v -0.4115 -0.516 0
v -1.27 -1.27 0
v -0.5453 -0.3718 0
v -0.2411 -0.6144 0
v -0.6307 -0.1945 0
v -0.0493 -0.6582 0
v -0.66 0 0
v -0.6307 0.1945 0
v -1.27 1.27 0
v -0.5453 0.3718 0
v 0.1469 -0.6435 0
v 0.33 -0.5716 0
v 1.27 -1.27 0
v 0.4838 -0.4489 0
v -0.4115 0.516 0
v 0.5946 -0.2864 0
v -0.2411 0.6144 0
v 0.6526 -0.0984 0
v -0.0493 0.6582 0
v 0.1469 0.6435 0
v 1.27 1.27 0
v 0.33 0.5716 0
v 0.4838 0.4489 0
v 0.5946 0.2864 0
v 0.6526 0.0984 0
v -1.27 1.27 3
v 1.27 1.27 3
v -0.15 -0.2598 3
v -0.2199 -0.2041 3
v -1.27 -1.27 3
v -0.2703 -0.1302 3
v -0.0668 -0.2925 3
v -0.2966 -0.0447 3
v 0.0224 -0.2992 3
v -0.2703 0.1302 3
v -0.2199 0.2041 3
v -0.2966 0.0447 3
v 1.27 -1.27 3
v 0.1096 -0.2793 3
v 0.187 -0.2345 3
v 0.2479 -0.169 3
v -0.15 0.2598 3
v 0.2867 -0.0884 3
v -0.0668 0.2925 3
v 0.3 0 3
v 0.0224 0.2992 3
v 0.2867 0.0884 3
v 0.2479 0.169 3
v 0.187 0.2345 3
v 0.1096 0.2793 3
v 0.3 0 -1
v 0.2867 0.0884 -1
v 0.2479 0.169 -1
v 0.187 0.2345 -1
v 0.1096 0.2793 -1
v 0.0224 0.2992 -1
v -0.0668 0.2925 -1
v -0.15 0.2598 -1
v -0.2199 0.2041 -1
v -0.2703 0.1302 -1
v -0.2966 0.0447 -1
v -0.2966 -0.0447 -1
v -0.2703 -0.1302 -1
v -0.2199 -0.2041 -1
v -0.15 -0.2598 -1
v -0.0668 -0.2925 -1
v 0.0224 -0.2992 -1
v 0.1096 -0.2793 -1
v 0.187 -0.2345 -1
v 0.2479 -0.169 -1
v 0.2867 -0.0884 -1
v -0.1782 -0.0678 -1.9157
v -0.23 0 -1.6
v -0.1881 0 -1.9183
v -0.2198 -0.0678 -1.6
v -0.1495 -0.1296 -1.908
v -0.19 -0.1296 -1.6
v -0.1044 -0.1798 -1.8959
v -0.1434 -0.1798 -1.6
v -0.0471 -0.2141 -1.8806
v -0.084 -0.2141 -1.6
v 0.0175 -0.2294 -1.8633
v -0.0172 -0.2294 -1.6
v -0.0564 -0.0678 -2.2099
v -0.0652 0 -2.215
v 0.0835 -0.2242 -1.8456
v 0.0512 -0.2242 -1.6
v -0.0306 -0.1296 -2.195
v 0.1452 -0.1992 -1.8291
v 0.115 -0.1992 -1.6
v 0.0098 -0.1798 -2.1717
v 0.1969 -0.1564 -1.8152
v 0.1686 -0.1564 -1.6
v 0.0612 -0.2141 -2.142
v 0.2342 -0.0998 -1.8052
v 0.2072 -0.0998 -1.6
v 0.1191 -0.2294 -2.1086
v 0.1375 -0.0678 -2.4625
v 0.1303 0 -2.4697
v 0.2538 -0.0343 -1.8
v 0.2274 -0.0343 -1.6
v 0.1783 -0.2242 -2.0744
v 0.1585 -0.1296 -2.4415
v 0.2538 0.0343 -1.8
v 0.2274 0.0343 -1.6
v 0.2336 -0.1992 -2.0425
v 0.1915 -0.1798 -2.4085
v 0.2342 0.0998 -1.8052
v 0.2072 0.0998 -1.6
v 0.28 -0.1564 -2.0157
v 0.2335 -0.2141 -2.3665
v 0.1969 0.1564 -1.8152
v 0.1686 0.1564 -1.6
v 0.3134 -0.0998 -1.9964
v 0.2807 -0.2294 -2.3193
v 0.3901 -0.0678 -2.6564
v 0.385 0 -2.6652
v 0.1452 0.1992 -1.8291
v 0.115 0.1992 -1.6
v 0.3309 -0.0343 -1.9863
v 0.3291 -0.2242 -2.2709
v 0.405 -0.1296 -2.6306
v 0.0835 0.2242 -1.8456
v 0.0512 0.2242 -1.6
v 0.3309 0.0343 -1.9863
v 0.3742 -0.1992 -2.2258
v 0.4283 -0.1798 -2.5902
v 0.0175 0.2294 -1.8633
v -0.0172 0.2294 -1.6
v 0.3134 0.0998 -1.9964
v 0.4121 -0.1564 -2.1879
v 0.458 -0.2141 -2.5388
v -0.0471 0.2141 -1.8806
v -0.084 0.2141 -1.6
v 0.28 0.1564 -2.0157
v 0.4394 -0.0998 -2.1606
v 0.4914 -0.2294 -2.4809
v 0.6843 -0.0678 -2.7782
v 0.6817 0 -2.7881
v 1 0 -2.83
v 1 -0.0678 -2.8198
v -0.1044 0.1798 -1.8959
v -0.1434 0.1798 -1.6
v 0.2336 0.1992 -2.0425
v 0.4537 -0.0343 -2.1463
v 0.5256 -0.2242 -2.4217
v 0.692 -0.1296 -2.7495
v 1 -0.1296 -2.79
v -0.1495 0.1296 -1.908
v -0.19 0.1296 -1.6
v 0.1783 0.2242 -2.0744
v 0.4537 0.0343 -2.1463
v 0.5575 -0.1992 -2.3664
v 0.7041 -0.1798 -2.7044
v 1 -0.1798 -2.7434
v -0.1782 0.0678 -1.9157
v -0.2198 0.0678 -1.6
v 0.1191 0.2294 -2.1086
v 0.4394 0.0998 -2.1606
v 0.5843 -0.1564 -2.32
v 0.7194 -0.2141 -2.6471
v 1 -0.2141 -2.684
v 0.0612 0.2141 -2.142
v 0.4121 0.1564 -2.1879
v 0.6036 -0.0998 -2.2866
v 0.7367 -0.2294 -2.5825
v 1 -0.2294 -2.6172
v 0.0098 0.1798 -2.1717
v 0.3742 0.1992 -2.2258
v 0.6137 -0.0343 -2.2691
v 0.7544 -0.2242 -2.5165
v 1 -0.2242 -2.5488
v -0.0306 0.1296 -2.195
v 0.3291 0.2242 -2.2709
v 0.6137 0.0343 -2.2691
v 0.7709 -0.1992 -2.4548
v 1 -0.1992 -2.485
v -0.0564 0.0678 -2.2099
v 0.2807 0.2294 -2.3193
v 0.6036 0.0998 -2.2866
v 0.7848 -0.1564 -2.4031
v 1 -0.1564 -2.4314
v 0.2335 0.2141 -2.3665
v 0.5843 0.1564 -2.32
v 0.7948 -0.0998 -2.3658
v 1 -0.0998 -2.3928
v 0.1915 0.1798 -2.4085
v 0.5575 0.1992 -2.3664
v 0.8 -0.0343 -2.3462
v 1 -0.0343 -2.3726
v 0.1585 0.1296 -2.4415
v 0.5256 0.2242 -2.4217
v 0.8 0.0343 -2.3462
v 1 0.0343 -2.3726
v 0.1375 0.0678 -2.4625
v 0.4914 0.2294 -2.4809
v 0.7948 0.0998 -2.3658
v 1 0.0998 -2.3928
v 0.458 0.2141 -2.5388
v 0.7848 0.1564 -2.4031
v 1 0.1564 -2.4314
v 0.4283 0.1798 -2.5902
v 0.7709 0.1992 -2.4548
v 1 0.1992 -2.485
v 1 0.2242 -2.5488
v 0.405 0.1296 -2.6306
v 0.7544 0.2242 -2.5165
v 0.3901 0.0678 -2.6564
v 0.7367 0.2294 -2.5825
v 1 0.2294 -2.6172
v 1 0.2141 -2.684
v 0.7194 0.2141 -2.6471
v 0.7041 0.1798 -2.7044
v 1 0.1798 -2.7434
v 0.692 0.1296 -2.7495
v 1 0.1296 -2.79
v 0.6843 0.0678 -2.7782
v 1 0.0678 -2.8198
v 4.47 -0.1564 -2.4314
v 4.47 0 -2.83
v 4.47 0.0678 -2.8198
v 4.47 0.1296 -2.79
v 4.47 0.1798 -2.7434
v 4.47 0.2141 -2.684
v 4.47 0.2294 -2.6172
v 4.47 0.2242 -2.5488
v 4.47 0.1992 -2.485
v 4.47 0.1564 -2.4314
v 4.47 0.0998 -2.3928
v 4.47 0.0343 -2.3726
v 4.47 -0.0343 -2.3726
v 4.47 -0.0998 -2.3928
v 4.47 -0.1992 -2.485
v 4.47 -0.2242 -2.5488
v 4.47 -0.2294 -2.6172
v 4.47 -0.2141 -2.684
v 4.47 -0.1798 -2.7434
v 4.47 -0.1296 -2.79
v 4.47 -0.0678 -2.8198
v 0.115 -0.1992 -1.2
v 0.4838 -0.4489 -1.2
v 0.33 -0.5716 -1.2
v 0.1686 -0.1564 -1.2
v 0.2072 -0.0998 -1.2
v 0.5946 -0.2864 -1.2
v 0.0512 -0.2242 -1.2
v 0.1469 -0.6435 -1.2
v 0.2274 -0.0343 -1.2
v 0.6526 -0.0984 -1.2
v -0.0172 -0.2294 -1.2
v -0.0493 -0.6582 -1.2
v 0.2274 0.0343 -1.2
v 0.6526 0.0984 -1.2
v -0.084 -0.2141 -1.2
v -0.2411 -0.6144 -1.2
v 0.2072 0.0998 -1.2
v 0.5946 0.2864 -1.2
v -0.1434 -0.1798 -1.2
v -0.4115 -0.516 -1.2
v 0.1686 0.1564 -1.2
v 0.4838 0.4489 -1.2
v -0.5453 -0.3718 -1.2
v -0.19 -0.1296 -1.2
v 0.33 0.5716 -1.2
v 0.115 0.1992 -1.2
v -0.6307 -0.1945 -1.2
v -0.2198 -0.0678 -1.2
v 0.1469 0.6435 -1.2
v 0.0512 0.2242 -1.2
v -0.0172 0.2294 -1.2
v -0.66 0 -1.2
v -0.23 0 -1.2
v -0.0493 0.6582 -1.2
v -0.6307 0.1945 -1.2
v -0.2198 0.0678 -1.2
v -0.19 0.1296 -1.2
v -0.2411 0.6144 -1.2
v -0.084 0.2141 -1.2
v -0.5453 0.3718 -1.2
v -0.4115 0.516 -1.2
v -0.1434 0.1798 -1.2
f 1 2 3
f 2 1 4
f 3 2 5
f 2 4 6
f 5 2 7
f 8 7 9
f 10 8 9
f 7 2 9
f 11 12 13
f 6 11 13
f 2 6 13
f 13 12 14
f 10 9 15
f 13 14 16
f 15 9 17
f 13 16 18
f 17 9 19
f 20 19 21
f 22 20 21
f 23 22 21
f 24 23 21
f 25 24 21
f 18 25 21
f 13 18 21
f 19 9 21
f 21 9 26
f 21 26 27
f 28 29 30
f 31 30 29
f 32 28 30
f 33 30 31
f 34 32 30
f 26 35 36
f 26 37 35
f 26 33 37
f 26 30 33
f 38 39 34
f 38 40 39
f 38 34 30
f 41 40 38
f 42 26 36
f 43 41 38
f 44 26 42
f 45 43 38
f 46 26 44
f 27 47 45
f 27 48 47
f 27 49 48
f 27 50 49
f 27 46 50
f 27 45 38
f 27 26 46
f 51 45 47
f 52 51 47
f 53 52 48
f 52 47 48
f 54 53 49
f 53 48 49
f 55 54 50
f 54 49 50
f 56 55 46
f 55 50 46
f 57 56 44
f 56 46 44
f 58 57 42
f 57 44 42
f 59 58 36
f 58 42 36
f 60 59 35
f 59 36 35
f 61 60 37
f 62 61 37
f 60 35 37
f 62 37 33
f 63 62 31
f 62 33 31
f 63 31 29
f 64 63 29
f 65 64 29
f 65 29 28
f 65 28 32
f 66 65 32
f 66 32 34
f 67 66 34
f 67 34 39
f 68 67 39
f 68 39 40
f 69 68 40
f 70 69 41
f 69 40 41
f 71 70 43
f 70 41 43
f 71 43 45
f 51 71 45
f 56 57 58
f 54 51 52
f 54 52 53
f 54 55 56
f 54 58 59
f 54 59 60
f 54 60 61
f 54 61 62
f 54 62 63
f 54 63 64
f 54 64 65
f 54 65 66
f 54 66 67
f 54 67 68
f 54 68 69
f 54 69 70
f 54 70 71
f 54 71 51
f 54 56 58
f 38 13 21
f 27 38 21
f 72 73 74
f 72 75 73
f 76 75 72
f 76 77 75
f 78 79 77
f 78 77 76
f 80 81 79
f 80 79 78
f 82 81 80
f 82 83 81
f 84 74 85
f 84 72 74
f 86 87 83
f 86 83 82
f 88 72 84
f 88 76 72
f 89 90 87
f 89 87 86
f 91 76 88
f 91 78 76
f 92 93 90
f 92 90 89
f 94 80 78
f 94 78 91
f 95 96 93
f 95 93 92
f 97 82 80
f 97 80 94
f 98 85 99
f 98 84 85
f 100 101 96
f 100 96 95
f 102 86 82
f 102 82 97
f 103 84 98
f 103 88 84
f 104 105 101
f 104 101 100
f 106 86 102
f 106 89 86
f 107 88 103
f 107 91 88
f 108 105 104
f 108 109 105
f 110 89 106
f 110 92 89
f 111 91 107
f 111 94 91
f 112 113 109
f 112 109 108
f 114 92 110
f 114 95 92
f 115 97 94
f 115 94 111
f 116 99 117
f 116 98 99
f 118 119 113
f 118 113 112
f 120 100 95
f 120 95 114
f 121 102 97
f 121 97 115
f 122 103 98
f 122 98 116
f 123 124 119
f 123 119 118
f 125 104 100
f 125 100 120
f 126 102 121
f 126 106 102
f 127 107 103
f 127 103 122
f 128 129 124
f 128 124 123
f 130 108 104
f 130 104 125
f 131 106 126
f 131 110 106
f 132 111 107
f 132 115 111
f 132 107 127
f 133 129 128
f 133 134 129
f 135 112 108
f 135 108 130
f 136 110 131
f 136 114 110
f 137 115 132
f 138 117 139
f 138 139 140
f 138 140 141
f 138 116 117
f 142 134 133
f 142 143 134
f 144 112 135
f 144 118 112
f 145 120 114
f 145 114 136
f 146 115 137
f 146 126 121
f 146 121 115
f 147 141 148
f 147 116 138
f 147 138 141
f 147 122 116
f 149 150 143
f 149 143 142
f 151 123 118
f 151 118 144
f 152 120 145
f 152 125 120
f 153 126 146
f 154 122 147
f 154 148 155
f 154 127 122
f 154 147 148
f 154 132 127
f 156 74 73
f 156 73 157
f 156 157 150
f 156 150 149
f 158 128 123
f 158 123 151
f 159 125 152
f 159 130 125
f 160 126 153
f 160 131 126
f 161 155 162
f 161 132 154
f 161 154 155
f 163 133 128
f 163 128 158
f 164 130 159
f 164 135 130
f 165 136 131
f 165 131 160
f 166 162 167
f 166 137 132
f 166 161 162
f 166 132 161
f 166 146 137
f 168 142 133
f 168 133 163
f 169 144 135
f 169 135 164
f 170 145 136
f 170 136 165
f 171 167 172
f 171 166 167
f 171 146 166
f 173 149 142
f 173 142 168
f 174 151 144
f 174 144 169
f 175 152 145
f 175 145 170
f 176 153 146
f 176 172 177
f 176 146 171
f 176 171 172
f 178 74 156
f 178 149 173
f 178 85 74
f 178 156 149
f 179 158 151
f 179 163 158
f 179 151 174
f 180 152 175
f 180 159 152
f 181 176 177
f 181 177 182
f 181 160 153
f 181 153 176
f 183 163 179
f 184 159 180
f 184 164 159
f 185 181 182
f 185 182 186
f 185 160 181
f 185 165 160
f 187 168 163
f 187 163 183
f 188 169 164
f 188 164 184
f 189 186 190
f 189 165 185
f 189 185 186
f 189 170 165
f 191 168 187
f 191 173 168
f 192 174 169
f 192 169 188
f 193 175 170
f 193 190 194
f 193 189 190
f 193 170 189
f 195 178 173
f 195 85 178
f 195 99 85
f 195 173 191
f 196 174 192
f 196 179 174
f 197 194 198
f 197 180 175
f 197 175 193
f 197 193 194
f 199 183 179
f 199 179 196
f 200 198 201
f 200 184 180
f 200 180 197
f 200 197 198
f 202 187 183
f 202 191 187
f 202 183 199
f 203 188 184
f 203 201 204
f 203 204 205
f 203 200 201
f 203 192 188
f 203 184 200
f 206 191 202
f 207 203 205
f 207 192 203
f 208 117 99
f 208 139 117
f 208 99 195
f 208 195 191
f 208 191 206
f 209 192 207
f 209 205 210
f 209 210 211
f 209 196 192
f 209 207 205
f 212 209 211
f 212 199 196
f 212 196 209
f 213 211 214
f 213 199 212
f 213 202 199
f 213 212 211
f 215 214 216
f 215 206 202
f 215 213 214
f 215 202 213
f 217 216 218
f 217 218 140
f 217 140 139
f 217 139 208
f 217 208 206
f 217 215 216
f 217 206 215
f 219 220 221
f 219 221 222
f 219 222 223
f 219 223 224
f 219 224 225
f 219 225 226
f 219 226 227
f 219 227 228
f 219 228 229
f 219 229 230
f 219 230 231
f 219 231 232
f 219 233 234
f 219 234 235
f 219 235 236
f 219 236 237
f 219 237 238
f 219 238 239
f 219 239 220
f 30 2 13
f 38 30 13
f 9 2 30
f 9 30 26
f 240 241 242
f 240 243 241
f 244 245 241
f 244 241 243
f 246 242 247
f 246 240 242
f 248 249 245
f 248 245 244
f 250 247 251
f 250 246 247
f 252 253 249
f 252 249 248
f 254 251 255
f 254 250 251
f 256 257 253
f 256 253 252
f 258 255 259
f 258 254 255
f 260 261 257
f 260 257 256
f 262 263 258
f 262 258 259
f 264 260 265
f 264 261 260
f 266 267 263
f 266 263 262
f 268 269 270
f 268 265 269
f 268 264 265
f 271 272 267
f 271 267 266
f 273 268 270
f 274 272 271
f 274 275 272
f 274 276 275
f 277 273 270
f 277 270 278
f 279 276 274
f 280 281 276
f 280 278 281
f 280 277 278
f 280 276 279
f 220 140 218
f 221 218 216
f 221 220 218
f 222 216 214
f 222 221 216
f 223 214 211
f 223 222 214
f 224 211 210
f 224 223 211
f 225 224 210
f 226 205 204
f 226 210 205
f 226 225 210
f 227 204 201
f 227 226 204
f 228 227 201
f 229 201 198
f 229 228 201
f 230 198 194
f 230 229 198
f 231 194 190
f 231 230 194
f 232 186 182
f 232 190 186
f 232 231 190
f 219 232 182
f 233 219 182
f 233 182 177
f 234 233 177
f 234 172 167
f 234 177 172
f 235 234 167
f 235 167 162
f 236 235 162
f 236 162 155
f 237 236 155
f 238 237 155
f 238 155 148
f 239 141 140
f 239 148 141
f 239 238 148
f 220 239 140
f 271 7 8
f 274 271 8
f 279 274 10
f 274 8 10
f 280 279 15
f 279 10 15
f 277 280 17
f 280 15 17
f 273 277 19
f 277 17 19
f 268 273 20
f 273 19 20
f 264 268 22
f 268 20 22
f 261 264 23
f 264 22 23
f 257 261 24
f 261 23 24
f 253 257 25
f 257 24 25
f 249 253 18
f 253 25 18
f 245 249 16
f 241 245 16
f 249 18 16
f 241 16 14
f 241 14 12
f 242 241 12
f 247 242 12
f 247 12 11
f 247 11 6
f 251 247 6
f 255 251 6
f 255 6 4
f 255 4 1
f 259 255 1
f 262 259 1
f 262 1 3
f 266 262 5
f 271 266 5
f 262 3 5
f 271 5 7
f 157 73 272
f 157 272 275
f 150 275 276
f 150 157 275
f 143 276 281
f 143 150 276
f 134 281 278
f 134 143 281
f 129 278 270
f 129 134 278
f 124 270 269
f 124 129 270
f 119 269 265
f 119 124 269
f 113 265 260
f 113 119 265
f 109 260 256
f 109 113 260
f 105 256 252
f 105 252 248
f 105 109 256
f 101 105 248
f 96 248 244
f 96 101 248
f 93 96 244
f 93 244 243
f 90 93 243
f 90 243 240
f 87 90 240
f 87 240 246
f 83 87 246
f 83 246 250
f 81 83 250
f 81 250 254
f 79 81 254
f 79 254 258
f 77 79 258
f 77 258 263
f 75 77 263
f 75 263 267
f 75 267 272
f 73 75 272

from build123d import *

# Parameters (mm, degrees)
SKETCH1_W           = 2.54
SKETCH1_H           = 2.54
BOSS_EXTRUDE1_DEPTH = 3
SKETCH2_R           = 0.66
BOSS_EXTRUDE2_DEPTH = 1.2
SKETCH4_R           = 0.3
CUT_EXTRUDE1_DEPTH  = 4
SKETCH3_R           = 0.23


with BuildPart() as part:
    # Sketch1 → Boss-Extrude1 (new body)
    with BuildSketch(Plane.XY):
        Rectangle(SKETCH1_W, SKETCH1_H)
    extrude(amount=BOSS_EXTRUDE1_DEPTH)

    # Sketch2 → Boss-Extrude2 (add)
    with BuildSketch(Plane(origin=(0, 0, 0), x_dir=(-1, 0, 0), z_dir=(0, 0, -1))):
        Circle(SKETCH2_R)
    extrude(amount=BOSS_EXTRUDE2_DEPTH)

    # Sketch4 → Cut-Extrude1 (cut)
    with BuildSketch(Plane.XY.offset(3)):
        Circle(SKETCH4_R)
    extrude(amount=-CUT_EXTRUDE1_DEPTH, mode=Mode.SUBTRACT)

    # Sweep1: sweep along a path in Sketch5
    with BuildLine(Plane(origin=(0, 0, 0), x_dir=(1, 0, 0), z_dir=(0, 1, 0))) as sweep1_path:
        Line((0, 1.2), (0, 1.6))
        ThreePointArc((0, 1.6), (0.292893219, 2.307106781), (1, 2.6))
        Line((1, 2.6), (4.47, 2.6))
    # Sketch3 → Sweep1 (sweep)
    with BuildSketch(Plane(origin=(0, 0, -1.2), x_dir=(-1, 0, 0), z_dir=(0, 0, -1))):
        Circle(SKETCH3_R)
    sweep(path=sweep1_path.line)


solid = part.part
